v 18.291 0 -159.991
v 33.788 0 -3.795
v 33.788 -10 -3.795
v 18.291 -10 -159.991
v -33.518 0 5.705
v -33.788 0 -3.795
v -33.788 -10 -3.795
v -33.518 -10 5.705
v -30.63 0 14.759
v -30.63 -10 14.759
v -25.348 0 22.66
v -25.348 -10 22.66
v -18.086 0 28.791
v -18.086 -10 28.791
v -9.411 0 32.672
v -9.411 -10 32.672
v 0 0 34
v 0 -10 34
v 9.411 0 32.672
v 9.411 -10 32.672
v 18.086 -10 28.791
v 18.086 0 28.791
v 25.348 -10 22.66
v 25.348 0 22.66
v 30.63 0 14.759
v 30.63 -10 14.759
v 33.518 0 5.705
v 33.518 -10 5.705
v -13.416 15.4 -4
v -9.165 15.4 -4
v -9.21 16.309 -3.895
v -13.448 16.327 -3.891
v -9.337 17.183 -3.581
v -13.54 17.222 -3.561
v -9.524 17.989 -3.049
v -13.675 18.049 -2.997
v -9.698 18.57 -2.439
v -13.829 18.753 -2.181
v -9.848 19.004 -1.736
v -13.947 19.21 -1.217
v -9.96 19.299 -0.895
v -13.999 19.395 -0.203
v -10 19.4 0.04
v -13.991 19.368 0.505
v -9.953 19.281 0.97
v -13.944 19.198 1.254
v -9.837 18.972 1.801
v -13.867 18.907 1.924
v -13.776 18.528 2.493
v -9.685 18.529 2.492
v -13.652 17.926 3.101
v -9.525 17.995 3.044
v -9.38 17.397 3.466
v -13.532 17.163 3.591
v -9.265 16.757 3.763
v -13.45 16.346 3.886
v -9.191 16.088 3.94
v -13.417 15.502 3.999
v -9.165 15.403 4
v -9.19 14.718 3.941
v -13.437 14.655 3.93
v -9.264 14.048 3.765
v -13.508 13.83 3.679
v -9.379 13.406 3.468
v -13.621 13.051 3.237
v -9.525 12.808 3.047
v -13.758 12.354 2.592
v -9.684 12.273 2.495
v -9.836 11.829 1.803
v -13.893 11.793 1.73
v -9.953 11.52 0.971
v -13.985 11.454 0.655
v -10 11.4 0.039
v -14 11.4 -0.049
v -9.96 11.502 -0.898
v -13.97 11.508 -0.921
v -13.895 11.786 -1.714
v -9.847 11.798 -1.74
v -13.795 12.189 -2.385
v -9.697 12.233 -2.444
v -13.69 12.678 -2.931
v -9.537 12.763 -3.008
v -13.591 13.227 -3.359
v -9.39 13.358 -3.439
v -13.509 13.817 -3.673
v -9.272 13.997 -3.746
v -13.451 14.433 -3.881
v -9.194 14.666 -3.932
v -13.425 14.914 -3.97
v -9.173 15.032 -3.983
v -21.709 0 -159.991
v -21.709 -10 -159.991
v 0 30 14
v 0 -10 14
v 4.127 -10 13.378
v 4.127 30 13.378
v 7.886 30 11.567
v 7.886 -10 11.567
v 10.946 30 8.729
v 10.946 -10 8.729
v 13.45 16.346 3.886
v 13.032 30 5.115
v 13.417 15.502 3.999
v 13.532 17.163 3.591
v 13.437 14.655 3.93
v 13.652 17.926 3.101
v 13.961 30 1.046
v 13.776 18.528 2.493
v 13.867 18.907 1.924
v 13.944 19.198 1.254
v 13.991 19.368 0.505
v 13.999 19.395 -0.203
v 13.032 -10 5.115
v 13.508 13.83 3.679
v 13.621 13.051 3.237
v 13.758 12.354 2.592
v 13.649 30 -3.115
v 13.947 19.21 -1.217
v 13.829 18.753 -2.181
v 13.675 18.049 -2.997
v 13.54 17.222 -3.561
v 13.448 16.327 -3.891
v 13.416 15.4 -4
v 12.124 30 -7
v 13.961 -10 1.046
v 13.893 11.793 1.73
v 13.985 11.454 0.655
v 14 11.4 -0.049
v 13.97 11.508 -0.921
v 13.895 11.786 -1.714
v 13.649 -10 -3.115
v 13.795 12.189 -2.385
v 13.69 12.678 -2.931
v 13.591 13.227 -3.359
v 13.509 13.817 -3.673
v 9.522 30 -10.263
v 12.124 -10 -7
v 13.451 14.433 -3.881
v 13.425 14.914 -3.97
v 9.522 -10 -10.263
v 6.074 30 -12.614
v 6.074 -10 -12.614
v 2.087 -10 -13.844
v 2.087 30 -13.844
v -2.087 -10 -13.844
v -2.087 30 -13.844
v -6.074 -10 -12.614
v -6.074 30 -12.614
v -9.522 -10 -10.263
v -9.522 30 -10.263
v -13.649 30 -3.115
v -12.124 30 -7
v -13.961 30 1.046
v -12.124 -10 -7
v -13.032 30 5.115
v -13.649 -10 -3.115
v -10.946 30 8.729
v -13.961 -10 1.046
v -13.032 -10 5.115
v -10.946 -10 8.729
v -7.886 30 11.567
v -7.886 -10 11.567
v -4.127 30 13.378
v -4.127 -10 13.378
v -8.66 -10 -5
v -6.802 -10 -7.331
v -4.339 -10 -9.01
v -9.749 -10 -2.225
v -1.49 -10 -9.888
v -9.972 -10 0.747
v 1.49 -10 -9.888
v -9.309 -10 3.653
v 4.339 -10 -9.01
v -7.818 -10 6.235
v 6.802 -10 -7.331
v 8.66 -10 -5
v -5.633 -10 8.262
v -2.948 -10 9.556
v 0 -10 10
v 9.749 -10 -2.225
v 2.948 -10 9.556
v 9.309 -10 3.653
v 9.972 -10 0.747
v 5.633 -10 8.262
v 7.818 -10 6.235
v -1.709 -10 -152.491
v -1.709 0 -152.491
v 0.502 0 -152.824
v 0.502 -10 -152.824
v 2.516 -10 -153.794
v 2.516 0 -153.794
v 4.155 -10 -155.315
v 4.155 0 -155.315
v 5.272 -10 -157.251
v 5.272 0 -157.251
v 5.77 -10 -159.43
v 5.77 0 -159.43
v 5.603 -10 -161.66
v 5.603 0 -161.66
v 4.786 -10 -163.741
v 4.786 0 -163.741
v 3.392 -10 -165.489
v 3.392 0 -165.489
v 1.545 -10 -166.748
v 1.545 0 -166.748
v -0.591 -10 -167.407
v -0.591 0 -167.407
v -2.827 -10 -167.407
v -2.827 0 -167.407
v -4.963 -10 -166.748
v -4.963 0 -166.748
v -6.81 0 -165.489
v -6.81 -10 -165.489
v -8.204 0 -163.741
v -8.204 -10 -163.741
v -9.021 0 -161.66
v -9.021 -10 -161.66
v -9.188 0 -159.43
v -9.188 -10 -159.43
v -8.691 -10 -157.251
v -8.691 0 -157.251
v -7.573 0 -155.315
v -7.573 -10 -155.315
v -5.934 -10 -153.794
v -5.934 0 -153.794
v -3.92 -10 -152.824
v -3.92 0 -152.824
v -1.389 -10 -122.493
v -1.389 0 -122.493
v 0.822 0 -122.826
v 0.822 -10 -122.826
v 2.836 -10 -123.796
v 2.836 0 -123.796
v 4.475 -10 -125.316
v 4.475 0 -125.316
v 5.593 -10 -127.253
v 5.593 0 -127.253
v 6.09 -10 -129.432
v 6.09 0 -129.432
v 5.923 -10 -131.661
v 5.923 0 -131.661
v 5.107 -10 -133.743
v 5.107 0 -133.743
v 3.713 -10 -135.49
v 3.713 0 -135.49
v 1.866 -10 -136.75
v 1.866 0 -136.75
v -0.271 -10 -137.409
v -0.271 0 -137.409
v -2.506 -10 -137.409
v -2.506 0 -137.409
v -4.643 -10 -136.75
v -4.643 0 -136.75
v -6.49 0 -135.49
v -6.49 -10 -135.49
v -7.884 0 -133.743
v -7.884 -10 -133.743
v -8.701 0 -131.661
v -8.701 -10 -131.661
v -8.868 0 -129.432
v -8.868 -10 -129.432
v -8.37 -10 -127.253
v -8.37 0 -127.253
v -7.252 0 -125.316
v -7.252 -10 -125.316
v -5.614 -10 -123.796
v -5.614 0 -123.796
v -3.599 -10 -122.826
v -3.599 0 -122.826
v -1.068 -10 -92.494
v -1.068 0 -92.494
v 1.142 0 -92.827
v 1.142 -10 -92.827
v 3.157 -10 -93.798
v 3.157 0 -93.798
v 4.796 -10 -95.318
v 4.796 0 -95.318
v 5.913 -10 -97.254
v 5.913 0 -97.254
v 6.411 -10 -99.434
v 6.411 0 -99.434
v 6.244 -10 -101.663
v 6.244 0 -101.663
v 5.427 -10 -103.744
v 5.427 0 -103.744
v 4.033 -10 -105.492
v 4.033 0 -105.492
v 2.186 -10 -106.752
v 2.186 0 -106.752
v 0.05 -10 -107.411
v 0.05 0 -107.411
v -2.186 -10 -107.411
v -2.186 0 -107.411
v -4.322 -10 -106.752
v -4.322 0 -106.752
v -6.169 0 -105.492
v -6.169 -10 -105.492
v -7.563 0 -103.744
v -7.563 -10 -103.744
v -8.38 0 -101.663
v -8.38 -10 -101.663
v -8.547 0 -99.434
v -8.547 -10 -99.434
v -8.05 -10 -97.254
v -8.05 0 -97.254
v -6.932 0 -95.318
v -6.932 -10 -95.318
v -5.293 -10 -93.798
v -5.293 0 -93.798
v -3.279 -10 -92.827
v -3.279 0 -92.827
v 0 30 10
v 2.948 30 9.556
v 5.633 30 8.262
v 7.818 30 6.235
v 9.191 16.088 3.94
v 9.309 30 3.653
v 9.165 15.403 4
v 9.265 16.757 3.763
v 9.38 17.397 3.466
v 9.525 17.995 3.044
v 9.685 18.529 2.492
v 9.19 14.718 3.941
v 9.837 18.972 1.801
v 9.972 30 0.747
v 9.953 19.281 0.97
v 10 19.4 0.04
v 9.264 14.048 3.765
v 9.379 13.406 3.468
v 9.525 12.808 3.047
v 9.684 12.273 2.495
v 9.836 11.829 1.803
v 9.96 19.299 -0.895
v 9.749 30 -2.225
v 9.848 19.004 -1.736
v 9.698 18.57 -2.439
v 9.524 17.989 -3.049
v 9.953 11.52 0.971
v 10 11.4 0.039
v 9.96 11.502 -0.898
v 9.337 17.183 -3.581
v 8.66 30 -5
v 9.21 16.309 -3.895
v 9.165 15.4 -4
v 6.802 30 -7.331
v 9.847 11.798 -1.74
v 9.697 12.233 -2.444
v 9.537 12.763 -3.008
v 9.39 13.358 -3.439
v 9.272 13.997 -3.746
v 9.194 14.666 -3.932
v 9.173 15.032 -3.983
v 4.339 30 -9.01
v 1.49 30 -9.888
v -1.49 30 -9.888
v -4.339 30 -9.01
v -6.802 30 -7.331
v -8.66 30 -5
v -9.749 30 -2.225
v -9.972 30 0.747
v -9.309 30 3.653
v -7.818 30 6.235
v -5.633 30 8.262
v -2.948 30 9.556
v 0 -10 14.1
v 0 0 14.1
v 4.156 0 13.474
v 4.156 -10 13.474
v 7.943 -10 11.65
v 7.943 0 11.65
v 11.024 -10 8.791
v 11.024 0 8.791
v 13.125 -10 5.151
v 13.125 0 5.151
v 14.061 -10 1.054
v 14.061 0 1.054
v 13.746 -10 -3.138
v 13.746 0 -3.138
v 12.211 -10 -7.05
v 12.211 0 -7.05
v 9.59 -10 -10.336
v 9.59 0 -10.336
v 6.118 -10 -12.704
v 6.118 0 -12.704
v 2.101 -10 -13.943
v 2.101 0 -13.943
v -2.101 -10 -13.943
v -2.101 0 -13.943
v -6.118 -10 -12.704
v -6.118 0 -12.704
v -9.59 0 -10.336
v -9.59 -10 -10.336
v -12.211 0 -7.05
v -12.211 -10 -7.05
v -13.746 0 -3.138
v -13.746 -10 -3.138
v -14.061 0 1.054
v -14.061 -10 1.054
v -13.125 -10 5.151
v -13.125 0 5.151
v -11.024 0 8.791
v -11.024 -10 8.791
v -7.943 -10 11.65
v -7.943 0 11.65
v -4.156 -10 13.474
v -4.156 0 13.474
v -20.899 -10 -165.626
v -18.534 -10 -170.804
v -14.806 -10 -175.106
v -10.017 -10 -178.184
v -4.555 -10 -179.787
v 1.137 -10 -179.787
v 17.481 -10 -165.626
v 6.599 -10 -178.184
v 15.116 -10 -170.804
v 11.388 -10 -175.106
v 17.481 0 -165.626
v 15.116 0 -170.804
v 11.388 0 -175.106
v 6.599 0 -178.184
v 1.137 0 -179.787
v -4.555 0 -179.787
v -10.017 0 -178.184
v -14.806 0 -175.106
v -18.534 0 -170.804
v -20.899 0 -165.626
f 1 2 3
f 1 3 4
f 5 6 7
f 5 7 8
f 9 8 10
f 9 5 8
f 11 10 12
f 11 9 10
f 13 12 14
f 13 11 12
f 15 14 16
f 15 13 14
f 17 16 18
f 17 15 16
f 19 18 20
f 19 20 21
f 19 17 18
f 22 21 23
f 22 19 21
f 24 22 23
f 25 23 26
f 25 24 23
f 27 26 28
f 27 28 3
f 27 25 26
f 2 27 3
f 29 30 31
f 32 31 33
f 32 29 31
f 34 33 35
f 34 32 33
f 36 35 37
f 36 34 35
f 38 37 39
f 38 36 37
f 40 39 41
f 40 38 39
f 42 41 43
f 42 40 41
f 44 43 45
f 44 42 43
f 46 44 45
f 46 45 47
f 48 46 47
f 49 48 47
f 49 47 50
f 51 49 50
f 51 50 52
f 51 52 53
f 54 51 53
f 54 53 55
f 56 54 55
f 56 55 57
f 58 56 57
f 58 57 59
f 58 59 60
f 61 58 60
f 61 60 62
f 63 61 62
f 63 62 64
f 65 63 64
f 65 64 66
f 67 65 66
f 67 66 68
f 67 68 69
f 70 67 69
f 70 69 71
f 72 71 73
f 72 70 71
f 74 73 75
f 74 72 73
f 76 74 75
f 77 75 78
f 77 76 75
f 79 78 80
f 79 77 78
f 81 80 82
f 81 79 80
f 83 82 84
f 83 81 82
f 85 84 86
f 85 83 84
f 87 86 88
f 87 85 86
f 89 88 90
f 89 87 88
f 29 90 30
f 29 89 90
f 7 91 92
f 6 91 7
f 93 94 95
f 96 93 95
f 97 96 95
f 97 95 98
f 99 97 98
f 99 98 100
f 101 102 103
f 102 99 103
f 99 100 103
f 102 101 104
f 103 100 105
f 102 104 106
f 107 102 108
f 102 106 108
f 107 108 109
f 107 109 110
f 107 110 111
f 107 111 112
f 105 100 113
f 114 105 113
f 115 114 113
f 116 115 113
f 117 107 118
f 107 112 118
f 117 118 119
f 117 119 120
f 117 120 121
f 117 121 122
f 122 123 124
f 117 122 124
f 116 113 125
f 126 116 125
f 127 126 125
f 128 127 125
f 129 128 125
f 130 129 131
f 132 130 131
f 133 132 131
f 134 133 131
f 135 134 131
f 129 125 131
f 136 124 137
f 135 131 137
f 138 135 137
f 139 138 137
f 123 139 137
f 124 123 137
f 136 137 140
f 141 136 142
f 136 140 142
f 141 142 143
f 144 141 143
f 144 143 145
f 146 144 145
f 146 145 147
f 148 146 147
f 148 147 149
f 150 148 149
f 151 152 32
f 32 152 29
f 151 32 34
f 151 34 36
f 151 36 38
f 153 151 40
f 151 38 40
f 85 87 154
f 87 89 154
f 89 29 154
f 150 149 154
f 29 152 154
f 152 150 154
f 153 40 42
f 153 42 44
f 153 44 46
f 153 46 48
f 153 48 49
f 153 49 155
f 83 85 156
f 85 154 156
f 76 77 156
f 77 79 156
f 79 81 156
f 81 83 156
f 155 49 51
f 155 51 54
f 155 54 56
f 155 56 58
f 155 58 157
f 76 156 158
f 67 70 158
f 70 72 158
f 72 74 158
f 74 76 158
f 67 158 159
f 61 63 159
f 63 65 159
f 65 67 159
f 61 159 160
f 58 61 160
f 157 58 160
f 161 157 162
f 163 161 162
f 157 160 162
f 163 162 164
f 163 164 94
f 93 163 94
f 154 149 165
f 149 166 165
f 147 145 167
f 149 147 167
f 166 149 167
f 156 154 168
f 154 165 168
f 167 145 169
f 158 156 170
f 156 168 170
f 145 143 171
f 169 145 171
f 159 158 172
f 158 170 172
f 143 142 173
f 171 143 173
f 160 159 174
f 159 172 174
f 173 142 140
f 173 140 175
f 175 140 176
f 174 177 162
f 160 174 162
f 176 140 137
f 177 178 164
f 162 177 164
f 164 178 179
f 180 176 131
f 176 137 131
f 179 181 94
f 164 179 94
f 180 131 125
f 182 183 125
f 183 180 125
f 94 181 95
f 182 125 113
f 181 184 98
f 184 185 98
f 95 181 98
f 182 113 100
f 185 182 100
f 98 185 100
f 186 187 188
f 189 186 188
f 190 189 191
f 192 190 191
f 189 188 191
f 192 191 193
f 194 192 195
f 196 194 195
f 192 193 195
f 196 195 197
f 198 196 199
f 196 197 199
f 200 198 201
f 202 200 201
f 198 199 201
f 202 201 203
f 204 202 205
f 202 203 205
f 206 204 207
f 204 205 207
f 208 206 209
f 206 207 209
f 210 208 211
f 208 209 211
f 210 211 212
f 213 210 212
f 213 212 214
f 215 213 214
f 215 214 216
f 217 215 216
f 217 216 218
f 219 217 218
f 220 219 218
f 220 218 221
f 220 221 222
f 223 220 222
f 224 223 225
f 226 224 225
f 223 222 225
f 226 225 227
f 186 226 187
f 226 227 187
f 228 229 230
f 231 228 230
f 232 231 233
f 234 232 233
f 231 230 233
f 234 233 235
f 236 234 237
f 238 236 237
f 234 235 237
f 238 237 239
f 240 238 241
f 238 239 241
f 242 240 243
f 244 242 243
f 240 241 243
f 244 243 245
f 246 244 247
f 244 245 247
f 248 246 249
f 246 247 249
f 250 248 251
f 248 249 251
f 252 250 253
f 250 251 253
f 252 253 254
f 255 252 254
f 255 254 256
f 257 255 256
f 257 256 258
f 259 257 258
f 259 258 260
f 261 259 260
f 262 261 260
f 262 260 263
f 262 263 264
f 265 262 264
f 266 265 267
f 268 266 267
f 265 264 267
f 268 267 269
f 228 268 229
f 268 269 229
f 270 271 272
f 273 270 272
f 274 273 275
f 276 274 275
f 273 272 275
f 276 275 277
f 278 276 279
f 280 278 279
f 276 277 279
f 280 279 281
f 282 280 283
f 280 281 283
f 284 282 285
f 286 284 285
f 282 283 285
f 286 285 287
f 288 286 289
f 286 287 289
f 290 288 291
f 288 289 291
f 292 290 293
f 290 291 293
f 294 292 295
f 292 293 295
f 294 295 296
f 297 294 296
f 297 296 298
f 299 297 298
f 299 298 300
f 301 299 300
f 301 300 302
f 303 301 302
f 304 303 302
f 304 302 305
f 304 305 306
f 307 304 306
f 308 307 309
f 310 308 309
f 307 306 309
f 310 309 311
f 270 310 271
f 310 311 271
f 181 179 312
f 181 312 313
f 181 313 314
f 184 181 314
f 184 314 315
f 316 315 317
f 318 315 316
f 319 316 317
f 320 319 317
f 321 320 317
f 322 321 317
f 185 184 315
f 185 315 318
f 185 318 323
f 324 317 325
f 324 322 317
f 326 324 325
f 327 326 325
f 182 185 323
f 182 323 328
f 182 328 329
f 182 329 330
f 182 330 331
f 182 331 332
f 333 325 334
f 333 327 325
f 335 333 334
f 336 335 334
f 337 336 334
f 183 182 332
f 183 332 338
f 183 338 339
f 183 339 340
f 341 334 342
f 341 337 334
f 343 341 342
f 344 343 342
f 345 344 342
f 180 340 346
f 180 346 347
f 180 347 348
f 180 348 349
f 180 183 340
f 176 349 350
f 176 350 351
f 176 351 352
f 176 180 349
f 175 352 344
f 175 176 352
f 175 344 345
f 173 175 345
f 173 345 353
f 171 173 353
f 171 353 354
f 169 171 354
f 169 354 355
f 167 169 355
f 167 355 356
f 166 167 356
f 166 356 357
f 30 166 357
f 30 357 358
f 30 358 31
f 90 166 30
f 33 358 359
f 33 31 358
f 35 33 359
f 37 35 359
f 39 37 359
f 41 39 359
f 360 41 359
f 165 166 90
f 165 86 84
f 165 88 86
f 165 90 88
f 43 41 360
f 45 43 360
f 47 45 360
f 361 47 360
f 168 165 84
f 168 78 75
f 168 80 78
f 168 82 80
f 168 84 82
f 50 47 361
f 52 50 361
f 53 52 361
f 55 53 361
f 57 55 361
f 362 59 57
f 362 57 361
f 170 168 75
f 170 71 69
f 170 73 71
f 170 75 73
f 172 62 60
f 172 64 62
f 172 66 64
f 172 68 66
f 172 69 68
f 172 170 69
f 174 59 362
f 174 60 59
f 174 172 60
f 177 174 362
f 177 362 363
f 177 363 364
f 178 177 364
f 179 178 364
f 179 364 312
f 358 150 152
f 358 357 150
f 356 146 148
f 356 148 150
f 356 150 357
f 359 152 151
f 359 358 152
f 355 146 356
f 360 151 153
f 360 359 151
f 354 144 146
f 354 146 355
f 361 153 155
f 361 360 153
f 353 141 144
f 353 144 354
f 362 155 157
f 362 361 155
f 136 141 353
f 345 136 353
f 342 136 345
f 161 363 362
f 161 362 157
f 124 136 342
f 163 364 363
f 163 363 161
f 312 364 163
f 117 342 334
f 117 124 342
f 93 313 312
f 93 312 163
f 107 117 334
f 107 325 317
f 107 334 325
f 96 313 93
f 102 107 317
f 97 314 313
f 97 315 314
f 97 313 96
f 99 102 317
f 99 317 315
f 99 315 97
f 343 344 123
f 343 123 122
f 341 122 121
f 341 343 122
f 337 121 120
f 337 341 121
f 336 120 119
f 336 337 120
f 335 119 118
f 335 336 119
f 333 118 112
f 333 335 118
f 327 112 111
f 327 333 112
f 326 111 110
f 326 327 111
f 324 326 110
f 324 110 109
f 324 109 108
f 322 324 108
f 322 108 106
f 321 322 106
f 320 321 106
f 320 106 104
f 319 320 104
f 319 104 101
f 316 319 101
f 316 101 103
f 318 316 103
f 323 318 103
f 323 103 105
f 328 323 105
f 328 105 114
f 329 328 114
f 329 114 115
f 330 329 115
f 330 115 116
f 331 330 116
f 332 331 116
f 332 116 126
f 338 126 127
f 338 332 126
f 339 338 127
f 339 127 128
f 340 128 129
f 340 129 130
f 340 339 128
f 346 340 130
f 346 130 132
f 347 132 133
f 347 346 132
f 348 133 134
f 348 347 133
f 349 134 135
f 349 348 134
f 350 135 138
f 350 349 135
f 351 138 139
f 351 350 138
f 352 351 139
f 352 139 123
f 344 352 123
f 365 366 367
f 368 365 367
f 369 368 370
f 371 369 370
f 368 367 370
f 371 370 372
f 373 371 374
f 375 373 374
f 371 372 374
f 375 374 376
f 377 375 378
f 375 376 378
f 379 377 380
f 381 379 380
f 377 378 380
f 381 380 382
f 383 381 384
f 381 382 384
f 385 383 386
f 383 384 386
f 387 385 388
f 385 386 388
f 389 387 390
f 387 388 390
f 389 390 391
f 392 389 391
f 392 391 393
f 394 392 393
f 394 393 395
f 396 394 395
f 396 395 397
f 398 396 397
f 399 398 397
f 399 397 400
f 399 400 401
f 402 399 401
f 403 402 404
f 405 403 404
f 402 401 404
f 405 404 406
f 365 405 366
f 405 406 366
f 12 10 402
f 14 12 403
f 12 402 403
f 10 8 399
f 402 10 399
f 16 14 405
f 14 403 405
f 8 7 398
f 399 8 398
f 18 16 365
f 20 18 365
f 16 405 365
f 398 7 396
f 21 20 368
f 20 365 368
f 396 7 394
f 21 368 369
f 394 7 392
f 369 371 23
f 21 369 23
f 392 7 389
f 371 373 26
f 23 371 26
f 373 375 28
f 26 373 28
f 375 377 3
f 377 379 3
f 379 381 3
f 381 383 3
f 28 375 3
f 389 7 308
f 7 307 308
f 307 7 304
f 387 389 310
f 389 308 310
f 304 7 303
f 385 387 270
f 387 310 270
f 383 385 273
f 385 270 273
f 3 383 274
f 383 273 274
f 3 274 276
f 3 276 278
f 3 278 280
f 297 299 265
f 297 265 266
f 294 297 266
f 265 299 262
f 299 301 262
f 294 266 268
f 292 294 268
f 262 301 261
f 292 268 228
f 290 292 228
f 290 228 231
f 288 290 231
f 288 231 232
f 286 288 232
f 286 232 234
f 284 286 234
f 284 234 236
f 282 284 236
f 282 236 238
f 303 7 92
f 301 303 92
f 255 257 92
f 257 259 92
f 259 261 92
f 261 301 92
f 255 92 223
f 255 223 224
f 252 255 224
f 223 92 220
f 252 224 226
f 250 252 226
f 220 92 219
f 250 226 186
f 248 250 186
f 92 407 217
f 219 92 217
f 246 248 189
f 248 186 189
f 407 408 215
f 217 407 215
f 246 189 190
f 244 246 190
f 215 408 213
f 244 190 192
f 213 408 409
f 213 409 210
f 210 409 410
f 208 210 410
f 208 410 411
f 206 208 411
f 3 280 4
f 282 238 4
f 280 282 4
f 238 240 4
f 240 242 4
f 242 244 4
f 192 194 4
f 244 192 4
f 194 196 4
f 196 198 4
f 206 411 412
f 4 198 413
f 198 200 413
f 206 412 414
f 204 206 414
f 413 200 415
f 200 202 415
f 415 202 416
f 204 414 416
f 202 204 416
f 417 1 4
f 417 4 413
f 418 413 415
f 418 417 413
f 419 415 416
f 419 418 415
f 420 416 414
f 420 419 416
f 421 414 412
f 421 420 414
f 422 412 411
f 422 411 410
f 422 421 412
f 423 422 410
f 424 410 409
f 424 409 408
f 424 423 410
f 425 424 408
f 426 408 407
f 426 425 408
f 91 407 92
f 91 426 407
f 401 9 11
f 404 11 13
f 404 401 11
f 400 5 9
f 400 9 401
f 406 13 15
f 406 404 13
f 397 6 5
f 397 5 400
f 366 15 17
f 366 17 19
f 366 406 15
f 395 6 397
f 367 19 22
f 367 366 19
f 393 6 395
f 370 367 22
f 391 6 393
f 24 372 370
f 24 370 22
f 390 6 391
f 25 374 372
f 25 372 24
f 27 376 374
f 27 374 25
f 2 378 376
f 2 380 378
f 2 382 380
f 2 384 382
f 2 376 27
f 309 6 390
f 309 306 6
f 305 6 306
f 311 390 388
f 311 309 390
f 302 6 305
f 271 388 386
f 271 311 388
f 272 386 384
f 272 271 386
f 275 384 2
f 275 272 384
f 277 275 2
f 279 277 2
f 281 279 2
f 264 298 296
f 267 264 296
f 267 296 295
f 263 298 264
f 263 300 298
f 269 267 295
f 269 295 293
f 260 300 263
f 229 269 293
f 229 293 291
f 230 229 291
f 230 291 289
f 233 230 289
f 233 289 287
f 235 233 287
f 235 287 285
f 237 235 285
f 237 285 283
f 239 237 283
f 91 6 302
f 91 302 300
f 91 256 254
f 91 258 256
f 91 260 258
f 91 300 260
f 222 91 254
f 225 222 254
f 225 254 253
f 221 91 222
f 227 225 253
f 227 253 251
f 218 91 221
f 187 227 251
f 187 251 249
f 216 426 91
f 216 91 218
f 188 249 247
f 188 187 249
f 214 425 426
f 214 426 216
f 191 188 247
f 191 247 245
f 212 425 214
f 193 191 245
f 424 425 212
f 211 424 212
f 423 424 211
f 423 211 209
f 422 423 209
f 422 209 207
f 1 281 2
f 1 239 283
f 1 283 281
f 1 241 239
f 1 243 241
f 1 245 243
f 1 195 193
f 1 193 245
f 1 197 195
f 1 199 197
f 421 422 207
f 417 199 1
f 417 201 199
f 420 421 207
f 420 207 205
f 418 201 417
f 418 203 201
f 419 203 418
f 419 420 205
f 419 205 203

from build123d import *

# Parameters (mm, degrees)
SKETCH1_R                = 14.1
SKETCH1_R_2              = 7.5
BASE_FLANGE1_DEPTH       = 10
BOSS_EXTRUDE1_DEPTH      = 30
BOSS_EXTRUDE1_DEPTH_BACK = 10
SKETCH6_R                = 14
SKETCH6_R_2              = 10
CUT_EXTRUDE1_DEPTH       = 186.614422829
CUT_EXTRUDE1_DEPTH_BACK  = 186.614422829
SKETCH8_R                = 4


# Sheet-metal steps are written as plain solids
with BuildPart() as part:
    # Sketch1 → Base-Flange1 (new body)
    with BuildSketch(Plane(origin=(0, 0, 0), x_dir=(1, 0, 0), z_dir=(0, 1, 0))):
        with BuildLine():
            Line((-21.709067953, 159.990871886), (-33.787508059, 3.795299618))
            ThreePointArc((-33.787508059, 3.795299618), (0, -34), (33.787508059, 3.795299618))
            Line((33.787508059, 3.795299618), (18.290932047, 159.990871886))
            ThreePointArc((18.290932047, 159.990871886), (-1.709067953, 179.990871886), (-21.709067953, 159.990871886))
        make_face()
        with Locations(Location((0, 0, 0), (0, 0, 270))):
            Circle(SKETCH1_R, mode=Mode.SUBTRACT)
        with Locations(Location((-1.709067953, 159.990871886, 0), (0, 0, 270))):
            Circle(SKETCH1_R_2, mode=Mode.SUBTRACT)
        with Locations(Location((-1.388617712, 129.992583407, 0), (0, 0, 270))):
            Circle(SKETCH1_R_2, mode=Mode.SUBTRACT)
        with Locations(Location((-1.068167471, 99.994294929, 0), (0, 0, 270))):
            Circle(SKETCH1_R_2, mode=Mode.SUBTRACT)
    extrude(amount=-BASE_FLANGE1_DEPTH)


with BuildPart() as body_2:
    # Sketch6 → Boss-Extrude1 (new, two sides: drawn at the far end of the back side and taken through both)
    with BuildSketch(Plane(origin=(0, 0, 0), x_dir=(1, 0, 0), z_dir=(0, 1, 0)).offset(-BOSS_EXTRUDE1_DEPTH_BACK)):
        with Locations(Location((0, 0, 0), (0, 0, 270))):
            Circle(SKETCH6_R)
        with Locations(Location((0, 0, 0), (0, 0, 270))):
            Circle(SKETCH6_R_2, mode=Mode.SUBTRACT)
    extrude(amount=BOSS_EXTRUDE1_DEPTH + BOSS_EXTRUDE1_DEPTH_BACK)

    # Sketch8 → Cut-Extrude1 (cut, two sides: drawn at the far end of the back side and taken through both)
    with BuildSketch(Plane(origin=(0, 0, 0), x_dir=(0, 0, -1), z_dir=(1, 0, 0)).offset(-CUT_EXTRUDE1_DEPTH_BACK)):
        with Locations((0, 15.4)):
            Circle(SKETCH8_R)
    extrude(amount=CUT_EXTRUDE1_DEPTH + CUT_EXTRUDE1_DEPTH_BACK, mode=Mode.SUBTRACT)


solid = Compound([part.part, body_2.part])
